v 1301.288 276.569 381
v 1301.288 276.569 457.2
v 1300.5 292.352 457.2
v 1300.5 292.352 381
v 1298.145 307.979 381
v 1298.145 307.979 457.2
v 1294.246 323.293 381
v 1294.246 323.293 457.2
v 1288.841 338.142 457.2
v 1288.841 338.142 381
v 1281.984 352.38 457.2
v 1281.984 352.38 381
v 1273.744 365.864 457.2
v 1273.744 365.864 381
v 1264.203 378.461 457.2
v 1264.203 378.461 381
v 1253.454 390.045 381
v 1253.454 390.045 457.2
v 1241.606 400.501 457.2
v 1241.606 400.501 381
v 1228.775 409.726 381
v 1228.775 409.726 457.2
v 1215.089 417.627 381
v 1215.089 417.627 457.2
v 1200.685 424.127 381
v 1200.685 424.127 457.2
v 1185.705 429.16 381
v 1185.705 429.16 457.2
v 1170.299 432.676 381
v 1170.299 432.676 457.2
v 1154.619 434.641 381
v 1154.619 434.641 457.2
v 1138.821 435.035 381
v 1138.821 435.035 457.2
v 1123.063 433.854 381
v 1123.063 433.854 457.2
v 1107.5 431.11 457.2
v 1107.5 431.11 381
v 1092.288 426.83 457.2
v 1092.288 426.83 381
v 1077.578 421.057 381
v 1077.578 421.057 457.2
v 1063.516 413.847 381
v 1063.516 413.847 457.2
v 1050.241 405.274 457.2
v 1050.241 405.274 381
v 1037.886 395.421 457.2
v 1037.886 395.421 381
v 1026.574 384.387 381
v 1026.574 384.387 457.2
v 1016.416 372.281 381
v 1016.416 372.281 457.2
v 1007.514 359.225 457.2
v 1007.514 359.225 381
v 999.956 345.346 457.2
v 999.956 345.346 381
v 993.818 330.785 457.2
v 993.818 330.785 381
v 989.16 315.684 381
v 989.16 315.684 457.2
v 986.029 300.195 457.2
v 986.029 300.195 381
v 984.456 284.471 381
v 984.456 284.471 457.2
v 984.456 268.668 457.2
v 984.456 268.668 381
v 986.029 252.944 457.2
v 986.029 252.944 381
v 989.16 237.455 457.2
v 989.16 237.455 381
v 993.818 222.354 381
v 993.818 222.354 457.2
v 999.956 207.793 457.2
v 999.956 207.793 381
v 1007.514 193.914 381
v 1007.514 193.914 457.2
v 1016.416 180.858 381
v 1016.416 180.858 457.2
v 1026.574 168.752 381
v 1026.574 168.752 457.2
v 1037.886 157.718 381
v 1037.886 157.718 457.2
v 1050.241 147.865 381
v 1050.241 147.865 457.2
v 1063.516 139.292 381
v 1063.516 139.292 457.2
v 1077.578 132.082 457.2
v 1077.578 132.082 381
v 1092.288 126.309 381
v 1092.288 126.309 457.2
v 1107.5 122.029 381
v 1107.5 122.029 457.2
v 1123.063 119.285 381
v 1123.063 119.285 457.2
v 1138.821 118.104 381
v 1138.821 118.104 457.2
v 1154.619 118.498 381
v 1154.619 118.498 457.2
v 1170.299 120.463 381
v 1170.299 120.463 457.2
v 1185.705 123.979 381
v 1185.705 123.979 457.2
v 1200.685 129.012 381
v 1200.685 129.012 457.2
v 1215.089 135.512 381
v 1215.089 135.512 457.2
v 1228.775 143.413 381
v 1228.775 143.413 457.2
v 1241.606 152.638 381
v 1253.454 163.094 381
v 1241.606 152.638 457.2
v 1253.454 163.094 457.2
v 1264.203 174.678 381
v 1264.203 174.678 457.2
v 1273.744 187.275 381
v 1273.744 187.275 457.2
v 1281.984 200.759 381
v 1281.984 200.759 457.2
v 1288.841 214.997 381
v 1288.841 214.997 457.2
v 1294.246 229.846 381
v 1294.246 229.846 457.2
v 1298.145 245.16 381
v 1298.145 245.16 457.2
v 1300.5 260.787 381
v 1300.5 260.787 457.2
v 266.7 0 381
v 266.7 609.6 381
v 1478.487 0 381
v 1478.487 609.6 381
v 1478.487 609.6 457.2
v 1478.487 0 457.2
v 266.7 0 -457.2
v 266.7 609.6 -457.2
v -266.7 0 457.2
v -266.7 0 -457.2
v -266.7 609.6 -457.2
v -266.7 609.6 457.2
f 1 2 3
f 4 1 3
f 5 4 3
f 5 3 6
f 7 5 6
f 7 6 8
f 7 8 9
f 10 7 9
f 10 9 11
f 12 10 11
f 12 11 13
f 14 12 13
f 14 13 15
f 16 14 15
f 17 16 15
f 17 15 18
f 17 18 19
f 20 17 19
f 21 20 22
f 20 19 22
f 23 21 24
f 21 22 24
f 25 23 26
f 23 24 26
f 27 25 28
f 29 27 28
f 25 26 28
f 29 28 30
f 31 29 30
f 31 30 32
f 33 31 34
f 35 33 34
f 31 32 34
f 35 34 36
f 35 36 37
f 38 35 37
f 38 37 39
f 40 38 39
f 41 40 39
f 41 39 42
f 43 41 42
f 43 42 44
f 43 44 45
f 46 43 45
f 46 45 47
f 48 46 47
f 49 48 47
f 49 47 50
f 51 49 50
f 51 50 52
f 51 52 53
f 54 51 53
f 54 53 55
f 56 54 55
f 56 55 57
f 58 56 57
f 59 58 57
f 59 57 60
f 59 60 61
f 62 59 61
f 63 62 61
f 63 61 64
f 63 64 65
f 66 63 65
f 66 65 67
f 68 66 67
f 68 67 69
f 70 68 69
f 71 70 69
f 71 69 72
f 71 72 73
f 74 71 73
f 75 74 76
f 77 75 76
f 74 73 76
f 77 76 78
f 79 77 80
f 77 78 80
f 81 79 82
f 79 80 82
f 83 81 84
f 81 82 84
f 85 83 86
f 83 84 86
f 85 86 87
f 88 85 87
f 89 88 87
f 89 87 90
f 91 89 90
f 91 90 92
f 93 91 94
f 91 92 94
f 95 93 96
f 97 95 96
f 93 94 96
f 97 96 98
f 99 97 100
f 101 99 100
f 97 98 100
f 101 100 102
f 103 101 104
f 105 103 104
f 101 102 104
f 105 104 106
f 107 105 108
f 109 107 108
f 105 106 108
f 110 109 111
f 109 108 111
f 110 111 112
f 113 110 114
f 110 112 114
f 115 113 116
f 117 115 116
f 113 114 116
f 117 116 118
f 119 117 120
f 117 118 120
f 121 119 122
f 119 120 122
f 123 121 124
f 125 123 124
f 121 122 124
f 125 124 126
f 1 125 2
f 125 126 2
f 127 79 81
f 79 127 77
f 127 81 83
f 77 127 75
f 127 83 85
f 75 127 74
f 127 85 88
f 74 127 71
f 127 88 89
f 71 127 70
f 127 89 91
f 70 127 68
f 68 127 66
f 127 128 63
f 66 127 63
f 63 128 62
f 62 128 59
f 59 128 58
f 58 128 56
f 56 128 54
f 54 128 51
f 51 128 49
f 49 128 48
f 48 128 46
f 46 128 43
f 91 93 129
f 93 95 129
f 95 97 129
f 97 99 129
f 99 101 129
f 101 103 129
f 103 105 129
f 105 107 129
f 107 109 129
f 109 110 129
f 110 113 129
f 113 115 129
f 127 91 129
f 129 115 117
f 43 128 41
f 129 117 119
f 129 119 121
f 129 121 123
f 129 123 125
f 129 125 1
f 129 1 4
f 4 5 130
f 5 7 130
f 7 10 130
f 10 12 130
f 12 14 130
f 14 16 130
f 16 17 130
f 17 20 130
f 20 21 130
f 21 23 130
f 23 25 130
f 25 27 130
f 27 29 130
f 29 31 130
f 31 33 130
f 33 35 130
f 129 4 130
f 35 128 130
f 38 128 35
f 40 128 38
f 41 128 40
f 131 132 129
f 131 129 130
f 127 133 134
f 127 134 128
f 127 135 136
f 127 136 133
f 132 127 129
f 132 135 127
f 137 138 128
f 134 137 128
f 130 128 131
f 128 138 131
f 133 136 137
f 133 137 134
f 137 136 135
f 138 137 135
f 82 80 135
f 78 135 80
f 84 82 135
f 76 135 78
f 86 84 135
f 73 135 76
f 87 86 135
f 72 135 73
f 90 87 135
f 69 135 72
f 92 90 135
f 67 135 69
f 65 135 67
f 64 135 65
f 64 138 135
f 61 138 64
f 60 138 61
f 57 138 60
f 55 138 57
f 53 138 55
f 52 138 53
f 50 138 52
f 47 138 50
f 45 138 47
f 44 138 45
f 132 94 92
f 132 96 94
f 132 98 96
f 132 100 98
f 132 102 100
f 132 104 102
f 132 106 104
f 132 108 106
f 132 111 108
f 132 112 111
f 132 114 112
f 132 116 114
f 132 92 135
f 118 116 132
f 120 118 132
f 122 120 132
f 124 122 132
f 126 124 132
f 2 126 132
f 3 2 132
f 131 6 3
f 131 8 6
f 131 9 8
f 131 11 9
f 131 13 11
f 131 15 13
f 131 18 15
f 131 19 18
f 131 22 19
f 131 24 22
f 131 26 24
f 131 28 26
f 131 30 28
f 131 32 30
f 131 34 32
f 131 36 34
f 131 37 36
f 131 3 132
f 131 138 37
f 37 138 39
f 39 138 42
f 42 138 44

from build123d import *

# Parameters (mm, degrees)
F0_W     = 533.4
F0_H     = 914.4
F1_DEPTH = 609.6
F2_W     = 1211.786538
F2_H     = 609.6
F3_DEPTH = 76.2
F4_R     = 158.514697
F5_DEPTH = 914.401


with BuildPart() as f1:
    # F0 (on Front) → F1 (new body)
    with BuildSketch(Plane.XZ):
        Rectangle(F0_W, F0_H)
    extrude(amount=-F1_DEPTH)

    # F2 (on face) → F3 (join)
    with BuildSketch(Plane.XY.offset(457.2)):
        with Locations((872.593269, 304.8)):
            Rectangle(F2_W, F2_H)
    extrude(amount=-F3_DEPTH)

    # F4 (on face) → F5 (cut, through all)
    with BuildSketch(Plane.XY.offset(457.2)):
        with Locations((1142.773271, 276.569486)):
            Circle(F4_R)
    extrude(amount=-F5_DEPTH, mode=Mode.SUBTRACT)


solid = f1.part
